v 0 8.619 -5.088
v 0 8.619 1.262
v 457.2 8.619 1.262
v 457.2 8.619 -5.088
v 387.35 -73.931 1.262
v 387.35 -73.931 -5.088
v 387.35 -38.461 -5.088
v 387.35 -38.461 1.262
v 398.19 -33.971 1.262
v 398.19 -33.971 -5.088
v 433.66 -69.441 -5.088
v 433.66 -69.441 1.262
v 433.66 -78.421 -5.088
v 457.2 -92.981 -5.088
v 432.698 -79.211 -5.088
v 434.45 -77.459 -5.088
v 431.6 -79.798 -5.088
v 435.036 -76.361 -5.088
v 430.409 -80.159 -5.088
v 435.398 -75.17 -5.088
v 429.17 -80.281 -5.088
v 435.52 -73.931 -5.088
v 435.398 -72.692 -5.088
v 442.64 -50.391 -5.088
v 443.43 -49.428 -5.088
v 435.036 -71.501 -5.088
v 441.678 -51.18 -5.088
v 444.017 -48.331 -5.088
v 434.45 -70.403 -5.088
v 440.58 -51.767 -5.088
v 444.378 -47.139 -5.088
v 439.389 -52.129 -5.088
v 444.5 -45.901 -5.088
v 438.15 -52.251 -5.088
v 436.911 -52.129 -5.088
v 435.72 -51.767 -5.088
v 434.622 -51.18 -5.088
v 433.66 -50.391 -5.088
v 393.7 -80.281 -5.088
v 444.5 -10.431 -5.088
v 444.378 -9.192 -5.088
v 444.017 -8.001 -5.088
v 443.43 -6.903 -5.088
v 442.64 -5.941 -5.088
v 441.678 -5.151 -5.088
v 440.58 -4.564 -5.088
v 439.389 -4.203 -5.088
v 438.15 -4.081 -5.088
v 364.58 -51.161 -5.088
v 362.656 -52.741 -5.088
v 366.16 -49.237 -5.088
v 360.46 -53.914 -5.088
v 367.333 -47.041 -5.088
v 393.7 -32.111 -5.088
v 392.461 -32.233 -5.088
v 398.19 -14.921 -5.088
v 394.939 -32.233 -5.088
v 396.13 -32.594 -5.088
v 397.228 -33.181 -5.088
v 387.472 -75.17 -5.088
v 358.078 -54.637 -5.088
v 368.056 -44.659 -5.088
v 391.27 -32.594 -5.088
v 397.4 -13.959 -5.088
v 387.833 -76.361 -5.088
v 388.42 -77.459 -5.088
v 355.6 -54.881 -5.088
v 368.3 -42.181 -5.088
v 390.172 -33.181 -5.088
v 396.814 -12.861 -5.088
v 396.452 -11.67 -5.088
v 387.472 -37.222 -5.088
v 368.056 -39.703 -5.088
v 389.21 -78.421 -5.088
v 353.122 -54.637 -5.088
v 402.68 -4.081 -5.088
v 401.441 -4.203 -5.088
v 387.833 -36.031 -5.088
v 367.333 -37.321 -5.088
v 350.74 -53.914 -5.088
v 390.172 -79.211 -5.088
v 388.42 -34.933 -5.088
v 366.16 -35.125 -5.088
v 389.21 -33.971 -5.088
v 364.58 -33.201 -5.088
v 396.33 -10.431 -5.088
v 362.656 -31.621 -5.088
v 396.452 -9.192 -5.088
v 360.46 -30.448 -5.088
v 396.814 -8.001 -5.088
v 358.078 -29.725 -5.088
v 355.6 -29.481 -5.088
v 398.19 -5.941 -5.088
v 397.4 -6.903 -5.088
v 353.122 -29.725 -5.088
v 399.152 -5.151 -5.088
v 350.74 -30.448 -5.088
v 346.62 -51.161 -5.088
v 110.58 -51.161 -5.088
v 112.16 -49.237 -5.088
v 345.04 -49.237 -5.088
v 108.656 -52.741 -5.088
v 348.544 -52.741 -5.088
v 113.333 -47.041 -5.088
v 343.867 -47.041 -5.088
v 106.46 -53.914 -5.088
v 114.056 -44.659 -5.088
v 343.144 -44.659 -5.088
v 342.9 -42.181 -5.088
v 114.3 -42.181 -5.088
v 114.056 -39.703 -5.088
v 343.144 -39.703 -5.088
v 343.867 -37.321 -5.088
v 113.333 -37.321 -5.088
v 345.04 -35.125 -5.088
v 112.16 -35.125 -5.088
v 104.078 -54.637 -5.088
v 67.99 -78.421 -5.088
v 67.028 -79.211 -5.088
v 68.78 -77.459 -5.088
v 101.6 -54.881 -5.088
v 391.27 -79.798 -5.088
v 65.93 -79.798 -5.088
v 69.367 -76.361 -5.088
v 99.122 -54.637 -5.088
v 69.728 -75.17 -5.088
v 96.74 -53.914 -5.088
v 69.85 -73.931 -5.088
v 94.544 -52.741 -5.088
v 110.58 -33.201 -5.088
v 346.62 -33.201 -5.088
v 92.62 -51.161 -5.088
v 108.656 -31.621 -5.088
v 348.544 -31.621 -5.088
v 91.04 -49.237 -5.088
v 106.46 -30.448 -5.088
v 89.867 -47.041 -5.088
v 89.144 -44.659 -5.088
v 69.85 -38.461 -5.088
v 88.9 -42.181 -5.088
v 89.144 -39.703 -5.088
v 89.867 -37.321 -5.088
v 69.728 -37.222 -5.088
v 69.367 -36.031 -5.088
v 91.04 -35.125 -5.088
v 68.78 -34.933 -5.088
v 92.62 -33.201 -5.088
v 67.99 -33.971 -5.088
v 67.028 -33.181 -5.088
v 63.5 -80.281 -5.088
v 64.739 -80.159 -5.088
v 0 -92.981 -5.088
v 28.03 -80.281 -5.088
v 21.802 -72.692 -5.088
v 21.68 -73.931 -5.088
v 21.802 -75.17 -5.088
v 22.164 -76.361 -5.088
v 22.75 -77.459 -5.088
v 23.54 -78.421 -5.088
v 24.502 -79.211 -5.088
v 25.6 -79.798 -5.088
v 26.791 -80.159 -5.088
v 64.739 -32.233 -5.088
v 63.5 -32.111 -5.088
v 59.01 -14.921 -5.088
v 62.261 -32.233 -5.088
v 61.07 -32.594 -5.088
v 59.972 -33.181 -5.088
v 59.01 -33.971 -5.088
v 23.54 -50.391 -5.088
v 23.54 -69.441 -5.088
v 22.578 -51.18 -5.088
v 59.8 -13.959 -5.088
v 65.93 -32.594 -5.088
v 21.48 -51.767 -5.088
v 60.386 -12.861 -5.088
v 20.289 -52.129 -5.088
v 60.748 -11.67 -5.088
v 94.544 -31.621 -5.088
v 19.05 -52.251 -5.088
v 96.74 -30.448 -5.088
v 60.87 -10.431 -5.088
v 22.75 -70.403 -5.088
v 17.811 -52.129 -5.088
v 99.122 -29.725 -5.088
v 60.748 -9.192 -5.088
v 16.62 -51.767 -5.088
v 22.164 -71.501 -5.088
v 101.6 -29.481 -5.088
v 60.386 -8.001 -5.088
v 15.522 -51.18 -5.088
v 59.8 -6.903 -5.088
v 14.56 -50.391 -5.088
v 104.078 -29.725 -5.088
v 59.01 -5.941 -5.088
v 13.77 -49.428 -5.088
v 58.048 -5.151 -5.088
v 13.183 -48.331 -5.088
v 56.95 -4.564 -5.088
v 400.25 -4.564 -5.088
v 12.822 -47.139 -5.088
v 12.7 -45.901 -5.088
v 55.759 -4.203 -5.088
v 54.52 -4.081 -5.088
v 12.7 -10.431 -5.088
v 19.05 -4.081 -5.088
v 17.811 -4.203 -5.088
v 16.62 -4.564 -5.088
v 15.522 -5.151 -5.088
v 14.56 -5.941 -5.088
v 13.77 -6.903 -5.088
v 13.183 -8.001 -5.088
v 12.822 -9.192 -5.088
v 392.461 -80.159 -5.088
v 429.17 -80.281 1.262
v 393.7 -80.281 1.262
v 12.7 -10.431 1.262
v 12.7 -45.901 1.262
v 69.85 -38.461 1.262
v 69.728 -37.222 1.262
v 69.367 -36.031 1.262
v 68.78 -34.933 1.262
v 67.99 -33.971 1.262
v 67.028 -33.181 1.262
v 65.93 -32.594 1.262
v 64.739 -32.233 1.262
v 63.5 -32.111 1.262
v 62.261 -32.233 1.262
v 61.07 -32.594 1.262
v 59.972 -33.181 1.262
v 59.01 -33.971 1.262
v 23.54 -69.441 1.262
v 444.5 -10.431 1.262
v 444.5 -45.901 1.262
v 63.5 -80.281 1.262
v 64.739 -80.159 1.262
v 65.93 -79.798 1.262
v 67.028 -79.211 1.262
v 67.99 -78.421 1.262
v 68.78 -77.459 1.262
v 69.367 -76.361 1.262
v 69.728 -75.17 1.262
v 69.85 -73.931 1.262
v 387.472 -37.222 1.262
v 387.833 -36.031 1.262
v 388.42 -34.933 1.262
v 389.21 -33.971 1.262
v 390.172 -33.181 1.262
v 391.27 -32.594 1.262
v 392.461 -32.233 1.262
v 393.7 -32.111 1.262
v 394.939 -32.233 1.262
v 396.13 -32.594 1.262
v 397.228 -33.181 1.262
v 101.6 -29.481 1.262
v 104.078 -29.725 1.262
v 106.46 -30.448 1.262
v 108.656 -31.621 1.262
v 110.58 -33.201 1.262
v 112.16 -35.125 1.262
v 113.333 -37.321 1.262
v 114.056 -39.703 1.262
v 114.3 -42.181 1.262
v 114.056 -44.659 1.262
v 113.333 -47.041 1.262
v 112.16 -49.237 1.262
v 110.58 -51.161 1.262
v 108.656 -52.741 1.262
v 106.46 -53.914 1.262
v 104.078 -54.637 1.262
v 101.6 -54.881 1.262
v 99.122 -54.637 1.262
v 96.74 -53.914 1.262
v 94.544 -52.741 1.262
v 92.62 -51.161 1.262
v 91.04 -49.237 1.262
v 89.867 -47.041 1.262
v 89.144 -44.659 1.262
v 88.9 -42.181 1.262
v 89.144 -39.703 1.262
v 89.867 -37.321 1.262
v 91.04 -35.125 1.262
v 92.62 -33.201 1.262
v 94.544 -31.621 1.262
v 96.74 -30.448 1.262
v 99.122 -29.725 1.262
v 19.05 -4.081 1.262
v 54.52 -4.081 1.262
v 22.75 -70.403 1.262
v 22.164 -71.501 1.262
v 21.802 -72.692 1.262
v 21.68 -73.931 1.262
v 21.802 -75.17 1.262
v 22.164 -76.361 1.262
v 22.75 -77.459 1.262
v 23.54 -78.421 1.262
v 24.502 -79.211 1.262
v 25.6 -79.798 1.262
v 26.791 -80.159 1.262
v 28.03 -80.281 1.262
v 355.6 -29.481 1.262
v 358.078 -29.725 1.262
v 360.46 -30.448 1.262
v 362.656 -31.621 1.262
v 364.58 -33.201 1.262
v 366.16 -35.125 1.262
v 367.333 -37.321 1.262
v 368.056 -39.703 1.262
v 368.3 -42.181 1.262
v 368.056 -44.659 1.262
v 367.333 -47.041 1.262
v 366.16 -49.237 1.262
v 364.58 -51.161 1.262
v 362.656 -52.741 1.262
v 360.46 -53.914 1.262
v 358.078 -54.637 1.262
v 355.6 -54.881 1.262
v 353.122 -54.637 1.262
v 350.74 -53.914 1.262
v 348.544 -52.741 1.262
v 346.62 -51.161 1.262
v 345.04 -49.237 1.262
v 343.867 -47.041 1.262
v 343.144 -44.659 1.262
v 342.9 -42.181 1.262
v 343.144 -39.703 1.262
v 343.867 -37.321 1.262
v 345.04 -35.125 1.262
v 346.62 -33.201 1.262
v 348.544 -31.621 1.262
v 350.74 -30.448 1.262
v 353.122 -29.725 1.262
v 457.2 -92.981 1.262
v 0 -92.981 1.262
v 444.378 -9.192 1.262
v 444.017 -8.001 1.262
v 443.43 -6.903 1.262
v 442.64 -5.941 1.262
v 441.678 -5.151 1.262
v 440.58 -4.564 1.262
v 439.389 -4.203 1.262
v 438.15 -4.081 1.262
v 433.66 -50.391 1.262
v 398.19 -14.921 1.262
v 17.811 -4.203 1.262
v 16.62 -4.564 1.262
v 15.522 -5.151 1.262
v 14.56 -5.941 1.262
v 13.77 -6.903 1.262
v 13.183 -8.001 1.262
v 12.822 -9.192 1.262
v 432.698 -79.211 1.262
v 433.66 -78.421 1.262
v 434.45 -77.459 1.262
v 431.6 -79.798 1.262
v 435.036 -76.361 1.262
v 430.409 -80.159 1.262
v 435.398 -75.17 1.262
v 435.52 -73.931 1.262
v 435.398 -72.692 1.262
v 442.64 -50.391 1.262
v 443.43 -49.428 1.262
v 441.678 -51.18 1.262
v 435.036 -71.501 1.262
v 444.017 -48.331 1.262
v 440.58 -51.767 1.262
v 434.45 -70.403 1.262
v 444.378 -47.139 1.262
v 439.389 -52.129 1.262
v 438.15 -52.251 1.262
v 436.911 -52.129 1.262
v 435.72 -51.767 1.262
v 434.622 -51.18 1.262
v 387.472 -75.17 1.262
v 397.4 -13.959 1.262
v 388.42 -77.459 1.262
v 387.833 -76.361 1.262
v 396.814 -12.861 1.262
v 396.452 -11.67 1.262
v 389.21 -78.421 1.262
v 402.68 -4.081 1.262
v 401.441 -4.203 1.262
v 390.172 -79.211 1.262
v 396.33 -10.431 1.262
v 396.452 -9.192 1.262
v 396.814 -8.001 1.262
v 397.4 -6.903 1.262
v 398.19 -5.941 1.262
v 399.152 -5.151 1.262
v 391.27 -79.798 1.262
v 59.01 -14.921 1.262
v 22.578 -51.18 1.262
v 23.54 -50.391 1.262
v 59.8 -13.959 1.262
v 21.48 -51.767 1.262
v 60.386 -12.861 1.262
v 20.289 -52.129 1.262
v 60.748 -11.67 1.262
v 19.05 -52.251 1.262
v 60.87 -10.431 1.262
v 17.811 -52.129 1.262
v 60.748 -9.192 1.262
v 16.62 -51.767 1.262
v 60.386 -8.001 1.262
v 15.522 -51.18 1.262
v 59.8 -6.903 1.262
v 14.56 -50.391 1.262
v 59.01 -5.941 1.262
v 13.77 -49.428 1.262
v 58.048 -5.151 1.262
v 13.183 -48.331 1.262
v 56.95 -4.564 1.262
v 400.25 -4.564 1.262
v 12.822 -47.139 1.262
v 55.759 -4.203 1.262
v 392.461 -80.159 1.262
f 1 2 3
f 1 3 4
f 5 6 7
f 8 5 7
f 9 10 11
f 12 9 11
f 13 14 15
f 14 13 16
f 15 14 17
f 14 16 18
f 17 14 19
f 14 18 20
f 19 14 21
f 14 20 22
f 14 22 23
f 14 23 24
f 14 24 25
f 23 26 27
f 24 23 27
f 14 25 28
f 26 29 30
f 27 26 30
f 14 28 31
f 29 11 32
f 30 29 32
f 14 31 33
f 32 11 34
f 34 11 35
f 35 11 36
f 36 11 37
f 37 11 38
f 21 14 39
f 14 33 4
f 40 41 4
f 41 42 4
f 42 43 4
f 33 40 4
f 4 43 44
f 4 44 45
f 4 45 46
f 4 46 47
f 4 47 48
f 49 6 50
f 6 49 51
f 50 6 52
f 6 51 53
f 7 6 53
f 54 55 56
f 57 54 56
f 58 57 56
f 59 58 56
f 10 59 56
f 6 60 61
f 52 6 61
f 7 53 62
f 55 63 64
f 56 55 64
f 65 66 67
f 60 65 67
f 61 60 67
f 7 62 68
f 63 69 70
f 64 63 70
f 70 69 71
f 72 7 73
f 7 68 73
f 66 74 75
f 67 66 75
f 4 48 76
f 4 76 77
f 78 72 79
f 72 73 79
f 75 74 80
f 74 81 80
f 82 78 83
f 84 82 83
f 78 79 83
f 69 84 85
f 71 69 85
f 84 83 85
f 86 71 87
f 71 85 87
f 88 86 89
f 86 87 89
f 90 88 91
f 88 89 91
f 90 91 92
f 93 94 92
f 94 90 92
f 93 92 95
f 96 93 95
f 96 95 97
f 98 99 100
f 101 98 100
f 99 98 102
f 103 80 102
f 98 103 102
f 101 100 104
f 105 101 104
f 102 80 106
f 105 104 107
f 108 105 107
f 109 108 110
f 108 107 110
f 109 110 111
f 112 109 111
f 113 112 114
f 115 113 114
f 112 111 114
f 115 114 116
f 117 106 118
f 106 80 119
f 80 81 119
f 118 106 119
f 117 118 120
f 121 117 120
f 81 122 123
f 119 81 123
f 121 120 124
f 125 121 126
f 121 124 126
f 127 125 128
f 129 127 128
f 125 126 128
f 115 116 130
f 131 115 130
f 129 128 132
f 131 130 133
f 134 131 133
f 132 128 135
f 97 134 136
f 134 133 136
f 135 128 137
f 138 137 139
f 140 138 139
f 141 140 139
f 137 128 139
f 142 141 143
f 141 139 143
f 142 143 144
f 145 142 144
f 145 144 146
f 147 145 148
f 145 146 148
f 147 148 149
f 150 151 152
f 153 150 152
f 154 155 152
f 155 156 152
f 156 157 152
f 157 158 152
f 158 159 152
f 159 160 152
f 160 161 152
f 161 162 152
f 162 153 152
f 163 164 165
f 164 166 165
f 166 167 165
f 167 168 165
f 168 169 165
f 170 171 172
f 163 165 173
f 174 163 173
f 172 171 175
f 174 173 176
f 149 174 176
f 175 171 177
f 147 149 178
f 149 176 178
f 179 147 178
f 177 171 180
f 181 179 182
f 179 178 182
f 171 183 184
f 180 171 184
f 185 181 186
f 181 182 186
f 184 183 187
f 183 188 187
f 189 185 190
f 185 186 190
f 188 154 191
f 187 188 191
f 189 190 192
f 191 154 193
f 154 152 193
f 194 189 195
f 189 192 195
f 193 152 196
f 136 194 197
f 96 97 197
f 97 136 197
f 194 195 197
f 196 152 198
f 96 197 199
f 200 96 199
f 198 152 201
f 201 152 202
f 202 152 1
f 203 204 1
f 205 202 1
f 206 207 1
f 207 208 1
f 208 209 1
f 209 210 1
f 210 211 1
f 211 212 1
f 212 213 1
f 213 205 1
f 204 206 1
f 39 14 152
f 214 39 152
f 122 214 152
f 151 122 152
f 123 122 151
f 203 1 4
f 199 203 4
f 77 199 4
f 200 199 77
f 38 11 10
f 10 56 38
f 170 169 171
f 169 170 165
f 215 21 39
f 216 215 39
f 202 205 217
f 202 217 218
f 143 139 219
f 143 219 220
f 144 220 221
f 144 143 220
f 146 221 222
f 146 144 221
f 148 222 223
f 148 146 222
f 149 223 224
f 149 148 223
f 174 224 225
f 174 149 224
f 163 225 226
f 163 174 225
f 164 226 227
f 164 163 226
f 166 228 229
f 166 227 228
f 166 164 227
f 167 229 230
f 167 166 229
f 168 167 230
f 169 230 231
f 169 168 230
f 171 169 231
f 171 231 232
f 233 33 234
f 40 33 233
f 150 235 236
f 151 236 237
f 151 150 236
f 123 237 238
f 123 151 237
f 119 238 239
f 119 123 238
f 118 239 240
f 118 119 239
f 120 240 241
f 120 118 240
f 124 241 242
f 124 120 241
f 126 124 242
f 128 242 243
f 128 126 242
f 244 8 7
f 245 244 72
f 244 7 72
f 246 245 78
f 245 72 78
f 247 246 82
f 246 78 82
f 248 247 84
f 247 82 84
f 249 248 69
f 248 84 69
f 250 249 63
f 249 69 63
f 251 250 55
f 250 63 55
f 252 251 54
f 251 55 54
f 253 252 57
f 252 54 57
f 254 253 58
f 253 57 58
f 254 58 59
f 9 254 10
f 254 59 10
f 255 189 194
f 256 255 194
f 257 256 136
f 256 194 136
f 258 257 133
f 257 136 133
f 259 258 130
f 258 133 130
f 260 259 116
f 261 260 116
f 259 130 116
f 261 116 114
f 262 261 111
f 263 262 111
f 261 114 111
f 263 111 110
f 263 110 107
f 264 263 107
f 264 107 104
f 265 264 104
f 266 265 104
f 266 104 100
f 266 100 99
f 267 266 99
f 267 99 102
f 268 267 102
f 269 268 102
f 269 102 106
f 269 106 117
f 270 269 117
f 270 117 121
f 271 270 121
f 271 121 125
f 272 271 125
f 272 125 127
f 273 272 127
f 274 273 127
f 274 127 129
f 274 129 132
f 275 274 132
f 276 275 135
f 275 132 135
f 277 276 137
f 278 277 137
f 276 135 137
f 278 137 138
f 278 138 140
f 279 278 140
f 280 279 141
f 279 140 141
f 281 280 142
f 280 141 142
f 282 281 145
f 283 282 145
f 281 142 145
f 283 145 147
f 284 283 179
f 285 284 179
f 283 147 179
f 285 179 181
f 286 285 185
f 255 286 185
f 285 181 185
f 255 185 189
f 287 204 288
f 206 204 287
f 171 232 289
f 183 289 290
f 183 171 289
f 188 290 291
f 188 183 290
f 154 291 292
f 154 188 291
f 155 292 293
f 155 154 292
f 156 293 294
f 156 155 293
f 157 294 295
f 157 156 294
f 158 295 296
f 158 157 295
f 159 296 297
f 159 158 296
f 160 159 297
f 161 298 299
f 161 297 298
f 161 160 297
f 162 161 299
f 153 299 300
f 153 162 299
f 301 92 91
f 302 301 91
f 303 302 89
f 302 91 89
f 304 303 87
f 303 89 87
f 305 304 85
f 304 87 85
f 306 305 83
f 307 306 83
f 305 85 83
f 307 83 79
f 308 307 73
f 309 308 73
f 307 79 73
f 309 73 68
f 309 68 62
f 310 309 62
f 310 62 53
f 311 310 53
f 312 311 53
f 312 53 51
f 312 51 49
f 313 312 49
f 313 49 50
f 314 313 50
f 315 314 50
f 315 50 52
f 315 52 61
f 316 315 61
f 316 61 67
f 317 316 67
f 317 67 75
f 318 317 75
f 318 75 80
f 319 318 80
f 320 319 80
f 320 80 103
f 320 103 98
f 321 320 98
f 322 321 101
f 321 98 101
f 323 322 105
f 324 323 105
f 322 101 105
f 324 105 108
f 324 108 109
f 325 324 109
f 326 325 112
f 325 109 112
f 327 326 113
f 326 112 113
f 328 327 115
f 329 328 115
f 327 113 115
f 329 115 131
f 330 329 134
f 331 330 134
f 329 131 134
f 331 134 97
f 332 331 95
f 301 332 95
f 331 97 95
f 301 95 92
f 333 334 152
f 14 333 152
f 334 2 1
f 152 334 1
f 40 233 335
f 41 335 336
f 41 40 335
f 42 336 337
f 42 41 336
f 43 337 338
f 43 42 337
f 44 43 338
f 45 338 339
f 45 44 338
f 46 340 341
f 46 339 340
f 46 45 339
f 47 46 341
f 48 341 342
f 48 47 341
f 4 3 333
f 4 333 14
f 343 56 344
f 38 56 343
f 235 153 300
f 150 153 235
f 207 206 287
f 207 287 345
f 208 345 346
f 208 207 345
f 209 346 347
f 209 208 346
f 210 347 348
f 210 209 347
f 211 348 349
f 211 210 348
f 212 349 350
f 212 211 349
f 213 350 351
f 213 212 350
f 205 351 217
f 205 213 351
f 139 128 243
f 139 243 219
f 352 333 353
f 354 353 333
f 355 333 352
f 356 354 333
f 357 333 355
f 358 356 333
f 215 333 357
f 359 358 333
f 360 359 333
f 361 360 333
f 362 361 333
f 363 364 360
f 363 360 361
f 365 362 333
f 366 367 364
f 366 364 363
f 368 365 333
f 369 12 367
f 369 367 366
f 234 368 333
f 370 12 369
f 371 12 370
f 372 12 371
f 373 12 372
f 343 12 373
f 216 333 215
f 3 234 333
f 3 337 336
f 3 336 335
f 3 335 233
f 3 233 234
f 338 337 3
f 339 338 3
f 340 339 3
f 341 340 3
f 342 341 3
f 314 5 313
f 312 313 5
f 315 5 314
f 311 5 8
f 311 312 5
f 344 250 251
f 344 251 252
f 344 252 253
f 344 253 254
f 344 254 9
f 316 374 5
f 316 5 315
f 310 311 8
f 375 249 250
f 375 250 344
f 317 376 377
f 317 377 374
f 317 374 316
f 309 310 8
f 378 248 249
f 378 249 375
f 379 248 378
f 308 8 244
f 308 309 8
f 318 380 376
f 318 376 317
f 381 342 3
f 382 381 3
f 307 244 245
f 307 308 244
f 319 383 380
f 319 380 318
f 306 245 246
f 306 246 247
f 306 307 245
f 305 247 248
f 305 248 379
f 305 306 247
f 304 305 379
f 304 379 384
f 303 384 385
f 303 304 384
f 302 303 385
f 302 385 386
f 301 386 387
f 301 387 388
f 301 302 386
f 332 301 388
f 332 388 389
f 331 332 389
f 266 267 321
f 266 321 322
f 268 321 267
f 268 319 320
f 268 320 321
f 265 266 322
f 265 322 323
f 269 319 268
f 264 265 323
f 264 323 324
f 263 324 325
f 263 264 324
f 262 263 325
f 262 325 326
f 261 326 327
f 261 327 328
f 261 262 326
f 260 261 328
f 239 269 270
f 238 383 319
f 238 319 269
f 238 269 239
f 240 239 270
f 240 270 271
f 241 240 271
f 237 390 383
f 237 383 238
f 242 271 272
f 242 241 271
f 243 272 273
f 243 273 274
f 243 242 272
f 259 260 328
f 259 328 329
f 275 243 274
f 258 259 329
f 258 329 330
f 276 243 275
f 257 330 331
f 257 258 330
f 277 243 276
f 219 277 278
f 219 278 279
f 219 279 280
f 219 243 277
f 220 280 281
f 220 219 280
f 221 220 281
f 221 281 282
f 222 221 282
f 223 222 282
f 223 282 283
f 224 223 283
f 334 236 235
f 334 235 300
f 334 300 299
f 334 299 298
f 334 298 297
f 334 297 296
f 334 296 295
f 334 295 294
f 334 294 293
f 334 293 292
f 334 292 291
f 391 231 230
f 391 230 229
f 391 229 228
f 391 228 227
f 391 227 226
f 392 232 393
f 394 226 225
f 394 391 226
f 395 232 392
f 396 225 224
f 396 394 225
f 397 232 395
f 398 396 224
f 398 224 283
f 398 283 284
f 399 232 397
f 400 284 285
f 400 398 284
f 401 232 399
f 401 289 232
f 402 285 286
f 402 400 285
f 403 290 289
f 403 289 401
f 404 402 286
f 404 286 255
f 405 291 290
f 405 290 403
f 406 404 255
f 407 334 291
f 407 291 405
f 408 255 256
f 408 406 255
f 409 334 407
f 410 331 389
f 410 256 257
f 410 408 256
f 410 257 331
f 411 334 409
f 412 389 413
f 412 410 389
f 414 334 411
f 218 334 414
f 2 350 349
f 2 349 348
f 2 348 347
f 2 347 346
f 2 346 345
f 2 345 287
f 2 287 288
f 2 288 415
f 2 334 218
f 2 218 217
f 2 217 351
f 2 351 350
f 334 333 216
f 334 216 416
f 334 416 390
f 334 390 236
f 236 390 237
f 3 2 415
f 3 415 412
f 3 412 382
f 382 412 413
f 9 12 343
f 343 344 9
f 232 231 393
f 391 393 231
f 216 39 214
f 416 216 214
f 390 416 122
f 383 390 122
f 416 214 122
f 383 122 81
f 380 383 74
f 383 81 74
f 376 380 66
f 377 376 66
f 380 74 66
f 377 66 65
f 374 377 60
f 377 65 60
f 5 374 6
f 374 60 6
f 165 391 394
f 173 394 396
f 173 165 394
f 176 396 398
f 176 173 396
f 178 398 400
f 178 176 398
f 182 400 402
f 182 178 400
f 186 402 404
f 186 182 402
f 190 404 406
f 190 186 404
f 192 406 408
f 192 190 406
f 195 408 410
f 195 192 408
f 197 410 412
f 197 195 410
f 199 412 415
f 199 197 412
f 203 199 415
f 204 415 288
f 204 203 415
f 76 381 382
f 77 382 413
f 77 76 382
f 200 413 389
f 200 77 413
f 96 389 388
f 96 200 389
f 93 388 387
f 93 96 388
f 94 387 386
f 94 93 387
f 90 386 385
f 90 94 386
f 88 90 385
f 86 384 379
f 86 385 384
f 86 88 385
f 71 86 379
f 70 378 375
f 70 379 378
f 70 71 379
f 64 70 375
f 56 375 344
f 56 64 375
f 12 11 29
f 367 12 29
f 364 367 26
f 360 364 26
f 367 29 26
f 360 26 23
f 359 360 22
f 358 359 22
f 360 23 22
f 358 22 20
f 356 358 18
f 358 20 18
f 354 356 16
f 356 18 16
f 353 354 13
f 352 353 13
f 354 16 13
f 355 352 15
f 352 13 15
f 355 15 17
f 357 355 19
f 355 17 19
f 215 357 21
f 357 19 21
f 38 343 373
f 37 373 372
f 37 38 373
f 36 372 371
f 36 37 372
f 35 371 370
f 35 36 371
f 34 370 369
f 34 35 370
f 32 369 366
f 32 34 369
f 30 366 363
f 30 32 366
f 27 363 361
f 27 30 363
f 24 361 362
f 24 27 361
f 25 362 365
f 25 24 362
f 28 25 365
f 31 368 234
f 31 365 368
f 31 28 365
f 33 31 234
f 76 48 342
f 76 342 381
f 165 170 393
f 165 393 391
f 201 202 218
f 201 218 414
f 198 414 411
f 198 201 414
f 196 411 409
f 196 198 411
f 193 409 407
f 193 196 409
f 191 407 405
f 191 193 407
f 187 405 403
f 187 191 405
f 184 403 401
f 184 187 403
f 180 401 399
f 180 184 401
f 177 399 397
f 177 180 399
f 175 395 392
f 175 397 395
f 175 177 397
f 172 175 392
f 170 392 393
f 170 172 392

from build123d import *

# Parameters (mm, degrees)
SKETCH1_W           = 6.35
SKETCH1_H           = 101.6
BOSS_EXTRUDE1_DEPTH = 457.2
SKETCH2_R           = 12.7
CUT_EXTRUDE1_DEPTH  = 467.602190566
CUT_EXTRUDE2_DEPTH  = 467.602190566


with BuildPart() as part:
    # Sketch1 → Boss-Extrude1 (new body)
    with BuildSketch(Plane(origin=(0, 0, 0), x_dir=(0, 0, -1), z_dir=(1, 0, 0))):
        with Locations((1.913371748, -42.180867605)):
            Rectangle(SKETCH1_W, SKETCH1_H)
    extrude(amount=BOSS_EXTRUDE1_DEPTH)

    # Sketch2 → Cut-Extrude1 (cut, through all)
    with BuildSketch(Plane(origin=(0, 0, -5.088371748), x_dir=(-1, 0, 0), z_dir=(0, 0, -1))):
        with Locations(Location((-355.6, -42.180867605, 0), (0, 0, 90))):
            Circle(SKETCH2_R)
        with Locations(Location((-101.6, -42.180867605, 0), (0, 0, 90))):
            Circle(SKETCH2_R)
    extrude(amount=-CUT_EXTRUDE1_DEPTH, mode=Mode.SUBTRACT)

    # Sketch3 → Cut-Extrude2 (cut, through all)
    with BuildSketch(Plane(origin=(0, 0, -5.088371748), x_dir=(-1, 0, 0), z_dir=(0, 0, -1))):
        with BuildLine():
            Line((-438.15, -4.080867605), (-402.680256121, -4.080867605))
            ThreePointArc((-402.680256121, -4.080867605), (-396.81362109, -8.000827809), (-398.190128061, -14.920995665))
            Line((-398.190128061, -14.920995665), (-433.659871939, -50.390739544))
            ThreePointArc((-433.659871939, -50.390739544), (-440.580039796, -51.767246515), (-444.5, -45.900611484))
            Line((-444.5, -45.900611484), (-444.5, -10.430867605))
            ThreePointArc((-444.5, -10.430867605), (-442.640128061, -5.940739544), (-438.15, -4.080867605))
        make_face()
        with BuildLine():
            Line((-398.190128061, -33.970995665), (-433.659871939, -69.440739544))
            ThreePointArc((-433.659871939, -69.440739544), (-435.03637891, -76.3609074), (-429.169743879, -80.280867605))
            Line((-429.169743879, -80.280867605), (-393.7, -80.280867605))
            ThreePointArc((-393.7, -80.280867605), (-389.209871939, -78.420995665), (-387.35, -73.930867605))
            Line((-387.35, -73.930867605), (-387.35, -38.461123726))
            ThreePointArc((-387.35, -38.461123726), (-391.269960204, -32.594488694), (-398.190128061, -33.970995665))
        make_face()
        with BuildLine():
            Line((-69.85, -73.930867605), (-69.85, -38.461123726))
            ThreePointArc((-69.85, -38.461123726), (-65.930039796, -32.594488694), (-59.009871939, -33.970995665))
            Line((-59.009871939, -33.970995665), (-23.540128061, -69.440739544))
            ThreePointArc((-23.540128061, -69.440739544), (-22.16362109, -76.3609074), (-28.030256121, -80.280867605))
            Line((-28.030256121, -80.280867605), (-63.5, -80.280867605))
            ThreePointArc((-63.5, -80.280867605), (-67.990128061, -78.420995665), (-69.85, -73.930867605))
        make_face()
        with BuildLine():
            Line((-23.540128061, -50.390739544), (-59.009871939, -14.920995665))
            ThreePointArc((-59.009871939, -14.920995665), (-60.38637891, -8.000827809), (-54.519743879, -4.080867605))
            Line((-54.519743879, -4.080867605), (-19.05, -4.080867605))
            ThreePointArc((-19.05, -4.080867605), (-14.559871939, -5.940739544), (-12.7, -10.430867605))
            Line((-12.7, -10.430867605), (-12.7, -45.900611484))
            ThreePointArc((-12.7, -45.900611484), (-16.619960204, -51.767246515), (-23.540128061, -50.390739544))
        make_face()
    extrude(amount=-CUT_EXTRUDE2_DEPTH, mode=Mode.SUBTRACT)


solid = part.part
